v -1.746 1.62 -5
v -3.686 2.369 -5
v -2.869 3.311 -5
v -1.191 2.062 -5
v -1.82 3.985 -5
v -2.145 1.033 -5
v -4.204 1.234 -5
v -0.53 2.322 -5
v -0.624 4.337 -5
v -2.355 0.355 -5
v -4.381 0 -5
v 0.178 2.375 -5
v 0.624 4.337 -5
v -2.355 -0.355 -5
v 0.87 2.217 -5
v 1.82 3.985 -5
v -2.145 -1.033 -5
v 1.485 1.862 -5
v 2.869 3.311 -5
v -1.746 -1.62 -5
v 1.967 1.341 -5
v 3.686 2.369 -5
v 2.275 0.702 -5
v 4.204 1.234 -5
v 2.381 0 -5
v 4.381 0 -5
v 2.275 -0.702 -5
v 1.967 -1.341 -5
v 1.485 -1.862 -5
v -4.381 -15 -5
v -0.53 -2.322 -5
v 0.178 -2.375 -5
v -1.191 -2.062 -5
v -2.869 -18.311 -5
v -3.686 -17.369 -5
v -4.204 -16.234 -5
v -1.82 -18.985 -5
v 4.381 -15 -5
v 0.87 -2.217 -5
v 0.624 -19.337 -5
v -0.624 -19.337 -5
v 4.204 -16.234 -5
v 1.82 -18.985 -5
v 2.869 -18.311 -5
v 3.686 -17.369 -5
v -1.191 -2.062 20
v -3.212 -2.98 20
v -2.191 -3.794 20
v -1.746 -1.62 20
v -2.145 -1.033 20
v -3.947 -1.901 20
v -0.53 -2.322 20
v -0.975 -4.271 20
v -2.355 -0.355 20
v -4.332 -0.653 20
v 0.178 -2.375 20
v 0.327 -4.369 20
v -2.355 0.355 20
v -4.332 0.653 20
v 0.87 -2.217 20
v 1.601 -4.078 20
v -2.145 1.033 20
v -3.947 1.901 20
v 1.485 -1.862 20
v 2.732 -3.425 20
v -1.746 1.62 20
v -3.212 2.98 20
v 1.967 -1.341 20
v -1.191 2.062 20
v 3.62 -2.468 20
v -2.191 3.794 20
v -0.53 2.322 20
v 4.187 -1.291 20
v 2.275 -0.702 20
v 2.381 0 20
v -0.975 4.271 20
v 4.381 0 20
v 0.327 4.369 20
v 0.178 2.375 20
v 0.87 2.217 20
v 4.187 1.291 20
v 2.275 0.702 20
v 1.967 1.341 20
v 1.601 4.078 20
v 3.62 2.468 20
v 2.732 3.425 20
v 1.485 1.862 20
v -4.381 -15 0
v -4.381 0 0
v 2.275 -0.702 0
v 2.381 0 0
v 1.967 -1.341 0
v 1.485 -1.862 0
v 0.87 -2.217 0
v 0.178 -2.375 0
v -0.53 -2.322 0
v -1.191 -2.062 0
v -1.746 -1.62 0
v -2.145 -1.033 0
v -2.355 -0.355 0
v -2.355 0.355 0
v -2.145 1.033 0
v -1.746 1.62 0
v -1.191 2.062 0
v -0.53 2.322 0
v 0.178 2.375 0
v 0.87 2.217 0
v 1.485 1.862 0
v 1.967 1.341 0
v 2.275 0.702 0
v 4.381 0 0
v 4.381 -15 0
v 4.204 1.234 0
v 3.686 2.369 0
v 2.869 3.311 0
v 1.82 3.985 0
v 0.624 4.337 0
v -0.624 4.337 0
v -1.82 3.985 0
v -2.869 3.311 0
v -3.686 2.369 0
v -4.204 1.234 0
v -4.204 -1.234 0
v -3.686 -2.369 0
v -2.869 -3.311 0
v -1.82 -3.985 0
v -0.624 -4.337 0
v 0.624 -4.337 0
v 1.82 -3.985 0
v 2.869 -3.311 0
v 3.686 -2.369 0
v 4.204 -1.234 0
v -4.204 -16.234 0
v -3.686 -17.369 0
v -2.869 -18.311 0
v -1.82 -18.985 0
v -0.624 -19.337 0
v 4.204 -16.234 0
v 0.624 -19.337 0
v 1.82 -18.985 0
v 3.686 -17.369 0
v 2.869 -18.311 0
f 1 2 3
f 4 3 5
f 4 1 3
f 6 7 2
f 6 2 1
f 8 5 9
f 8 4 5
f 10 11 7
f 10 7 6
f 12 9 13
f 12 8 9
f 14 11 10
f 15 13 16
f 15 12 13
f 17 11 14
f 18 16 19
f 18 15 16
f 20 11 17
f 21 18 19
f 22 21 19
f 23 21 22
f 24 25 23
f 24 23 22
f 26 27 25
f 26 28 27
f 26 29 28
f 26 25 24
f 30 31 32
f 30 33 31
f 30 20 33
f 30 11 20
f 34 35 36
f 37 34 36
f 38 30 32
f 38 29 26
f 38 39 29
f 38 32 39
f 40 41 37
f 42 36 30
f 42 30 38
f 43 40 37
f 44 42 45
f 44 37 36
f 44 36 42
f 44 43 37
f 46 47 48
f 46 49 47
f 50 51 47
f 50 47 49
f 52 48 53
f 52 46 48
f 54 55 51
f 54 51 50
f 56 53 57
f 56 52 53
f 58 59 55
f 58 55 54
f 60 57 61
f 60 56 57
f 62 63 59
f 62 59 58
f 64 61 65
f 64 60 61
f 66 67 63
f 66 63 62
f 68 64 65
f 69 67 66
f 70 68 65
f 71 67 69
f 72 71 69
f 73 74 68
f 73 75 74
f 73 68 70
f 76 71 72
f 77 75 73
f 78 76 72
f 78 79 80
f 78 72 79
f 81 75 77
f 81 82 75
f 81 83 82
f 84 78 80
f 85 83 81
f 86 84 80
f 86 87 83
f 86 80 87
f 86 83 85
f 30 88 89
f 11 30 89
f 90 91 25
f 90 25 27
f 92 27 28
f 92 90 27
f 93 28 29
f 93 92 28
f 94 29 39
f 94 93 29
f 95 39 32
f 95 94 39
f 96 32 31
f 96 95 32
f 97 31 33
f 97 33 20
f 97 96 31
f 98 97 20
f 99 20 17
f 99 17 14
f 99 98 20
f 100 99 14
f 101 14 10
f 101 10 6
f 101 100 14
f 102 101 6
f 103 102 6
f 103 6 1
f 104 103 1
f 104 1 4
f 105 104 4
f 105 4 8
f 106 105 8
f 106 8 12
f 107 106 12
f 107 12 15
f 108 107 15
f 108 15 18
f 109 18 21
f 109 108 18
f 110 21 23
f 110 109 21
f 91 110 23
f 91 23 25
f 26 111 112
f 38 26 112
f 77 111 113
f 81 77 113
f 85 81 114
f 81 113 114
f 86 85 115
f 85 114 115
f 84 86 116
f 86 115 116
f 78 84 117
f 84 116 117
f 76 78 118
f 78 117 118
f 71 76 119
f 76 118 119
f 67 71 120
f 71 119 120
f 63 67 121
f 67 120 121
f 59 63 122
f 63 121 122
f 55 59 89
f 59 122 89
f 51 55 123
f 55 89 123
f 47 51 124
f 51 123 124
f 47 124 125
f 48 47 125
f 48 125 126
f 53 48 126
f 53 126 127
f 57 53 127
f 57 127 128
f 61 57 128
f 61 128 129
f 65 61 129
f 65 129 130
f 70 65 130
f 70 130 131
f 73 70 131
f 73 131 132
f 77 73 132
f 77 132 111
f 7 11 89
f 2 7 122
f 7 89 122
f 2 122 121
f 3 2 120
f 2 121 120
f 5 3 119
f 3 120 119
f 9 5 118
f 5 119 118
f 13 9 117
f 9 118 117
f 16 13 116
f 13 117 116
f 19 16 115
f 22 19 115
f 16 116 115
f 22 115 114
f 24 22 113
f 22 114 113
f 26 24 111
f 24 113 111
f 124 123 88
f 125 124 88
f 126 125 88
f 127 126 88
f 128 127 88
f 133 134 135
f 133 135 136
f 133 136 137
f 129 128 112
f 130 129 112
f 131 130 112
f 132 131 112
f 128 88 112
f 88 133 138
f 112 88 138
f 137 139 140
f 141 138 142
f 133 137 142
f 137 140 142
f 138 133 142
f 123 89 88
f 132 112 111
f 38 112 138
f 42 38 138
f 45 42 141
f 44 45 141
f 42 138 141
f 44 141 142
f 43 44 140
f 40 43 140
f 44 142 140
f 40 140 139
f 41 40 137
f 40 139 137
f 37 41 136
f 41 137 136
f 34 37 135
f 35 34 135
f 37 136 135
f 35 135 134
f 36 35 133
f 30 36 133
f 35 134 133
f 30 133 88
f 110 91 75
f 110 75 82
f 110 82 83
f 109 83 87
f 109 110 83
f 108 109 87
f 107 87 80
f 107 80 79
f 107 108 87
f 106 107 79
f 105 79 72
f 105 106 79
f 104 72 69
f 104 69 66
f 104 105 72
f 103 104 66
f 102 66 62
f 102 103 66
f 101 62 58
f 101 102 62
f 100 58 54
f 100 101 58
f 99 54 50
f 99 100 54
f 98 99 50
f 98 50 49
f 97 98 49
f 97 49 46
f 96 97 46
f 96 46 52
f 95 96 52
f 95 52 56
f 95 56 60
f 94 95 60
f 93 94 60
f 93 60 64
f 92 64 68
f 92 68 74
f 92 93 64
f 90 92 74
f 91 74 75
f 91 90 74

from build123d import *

# Parameters (mm, degrees)
F0_R     = 4.38125
F0_R_2   = 2.38125
F1_DEPTH = 20
F2_R     = 2.38125
F3_DEPTH = 5


with BuildPart() as f1:
    # F0 (on Top) → F1 (new body)
    with BuildSketch(Plane.XY):
        Circle(F0_R)
        Circle(F0_R_2, mode=Mode.SUBTRACT)
    extrude(amount=F1_DEPTH)

    # F2 (on face) → F3 (join)
    with BuildSketch(Plane(origin=(0, 0, 0), x_dir=(1, 0, 0), z_dir=(0, 0, -1))):
        with BuildLine():
            Line((-4.38125, 15), (-4.38125, 0))
            ThreePointArc((-4.38125, 0), (0, -4.38125), (4.38125, 0))
            Line((4.38125, 0), (4.38125, 15))
            ThreePointArc((4.38125, 15), (0, 19.38125), (-4.38125, 15))
        make_face()
        Circle(F2_R, mode=Mode.SUBTRACT)
    extrude(amount=F3_DEPTH)


solid = f1.part
